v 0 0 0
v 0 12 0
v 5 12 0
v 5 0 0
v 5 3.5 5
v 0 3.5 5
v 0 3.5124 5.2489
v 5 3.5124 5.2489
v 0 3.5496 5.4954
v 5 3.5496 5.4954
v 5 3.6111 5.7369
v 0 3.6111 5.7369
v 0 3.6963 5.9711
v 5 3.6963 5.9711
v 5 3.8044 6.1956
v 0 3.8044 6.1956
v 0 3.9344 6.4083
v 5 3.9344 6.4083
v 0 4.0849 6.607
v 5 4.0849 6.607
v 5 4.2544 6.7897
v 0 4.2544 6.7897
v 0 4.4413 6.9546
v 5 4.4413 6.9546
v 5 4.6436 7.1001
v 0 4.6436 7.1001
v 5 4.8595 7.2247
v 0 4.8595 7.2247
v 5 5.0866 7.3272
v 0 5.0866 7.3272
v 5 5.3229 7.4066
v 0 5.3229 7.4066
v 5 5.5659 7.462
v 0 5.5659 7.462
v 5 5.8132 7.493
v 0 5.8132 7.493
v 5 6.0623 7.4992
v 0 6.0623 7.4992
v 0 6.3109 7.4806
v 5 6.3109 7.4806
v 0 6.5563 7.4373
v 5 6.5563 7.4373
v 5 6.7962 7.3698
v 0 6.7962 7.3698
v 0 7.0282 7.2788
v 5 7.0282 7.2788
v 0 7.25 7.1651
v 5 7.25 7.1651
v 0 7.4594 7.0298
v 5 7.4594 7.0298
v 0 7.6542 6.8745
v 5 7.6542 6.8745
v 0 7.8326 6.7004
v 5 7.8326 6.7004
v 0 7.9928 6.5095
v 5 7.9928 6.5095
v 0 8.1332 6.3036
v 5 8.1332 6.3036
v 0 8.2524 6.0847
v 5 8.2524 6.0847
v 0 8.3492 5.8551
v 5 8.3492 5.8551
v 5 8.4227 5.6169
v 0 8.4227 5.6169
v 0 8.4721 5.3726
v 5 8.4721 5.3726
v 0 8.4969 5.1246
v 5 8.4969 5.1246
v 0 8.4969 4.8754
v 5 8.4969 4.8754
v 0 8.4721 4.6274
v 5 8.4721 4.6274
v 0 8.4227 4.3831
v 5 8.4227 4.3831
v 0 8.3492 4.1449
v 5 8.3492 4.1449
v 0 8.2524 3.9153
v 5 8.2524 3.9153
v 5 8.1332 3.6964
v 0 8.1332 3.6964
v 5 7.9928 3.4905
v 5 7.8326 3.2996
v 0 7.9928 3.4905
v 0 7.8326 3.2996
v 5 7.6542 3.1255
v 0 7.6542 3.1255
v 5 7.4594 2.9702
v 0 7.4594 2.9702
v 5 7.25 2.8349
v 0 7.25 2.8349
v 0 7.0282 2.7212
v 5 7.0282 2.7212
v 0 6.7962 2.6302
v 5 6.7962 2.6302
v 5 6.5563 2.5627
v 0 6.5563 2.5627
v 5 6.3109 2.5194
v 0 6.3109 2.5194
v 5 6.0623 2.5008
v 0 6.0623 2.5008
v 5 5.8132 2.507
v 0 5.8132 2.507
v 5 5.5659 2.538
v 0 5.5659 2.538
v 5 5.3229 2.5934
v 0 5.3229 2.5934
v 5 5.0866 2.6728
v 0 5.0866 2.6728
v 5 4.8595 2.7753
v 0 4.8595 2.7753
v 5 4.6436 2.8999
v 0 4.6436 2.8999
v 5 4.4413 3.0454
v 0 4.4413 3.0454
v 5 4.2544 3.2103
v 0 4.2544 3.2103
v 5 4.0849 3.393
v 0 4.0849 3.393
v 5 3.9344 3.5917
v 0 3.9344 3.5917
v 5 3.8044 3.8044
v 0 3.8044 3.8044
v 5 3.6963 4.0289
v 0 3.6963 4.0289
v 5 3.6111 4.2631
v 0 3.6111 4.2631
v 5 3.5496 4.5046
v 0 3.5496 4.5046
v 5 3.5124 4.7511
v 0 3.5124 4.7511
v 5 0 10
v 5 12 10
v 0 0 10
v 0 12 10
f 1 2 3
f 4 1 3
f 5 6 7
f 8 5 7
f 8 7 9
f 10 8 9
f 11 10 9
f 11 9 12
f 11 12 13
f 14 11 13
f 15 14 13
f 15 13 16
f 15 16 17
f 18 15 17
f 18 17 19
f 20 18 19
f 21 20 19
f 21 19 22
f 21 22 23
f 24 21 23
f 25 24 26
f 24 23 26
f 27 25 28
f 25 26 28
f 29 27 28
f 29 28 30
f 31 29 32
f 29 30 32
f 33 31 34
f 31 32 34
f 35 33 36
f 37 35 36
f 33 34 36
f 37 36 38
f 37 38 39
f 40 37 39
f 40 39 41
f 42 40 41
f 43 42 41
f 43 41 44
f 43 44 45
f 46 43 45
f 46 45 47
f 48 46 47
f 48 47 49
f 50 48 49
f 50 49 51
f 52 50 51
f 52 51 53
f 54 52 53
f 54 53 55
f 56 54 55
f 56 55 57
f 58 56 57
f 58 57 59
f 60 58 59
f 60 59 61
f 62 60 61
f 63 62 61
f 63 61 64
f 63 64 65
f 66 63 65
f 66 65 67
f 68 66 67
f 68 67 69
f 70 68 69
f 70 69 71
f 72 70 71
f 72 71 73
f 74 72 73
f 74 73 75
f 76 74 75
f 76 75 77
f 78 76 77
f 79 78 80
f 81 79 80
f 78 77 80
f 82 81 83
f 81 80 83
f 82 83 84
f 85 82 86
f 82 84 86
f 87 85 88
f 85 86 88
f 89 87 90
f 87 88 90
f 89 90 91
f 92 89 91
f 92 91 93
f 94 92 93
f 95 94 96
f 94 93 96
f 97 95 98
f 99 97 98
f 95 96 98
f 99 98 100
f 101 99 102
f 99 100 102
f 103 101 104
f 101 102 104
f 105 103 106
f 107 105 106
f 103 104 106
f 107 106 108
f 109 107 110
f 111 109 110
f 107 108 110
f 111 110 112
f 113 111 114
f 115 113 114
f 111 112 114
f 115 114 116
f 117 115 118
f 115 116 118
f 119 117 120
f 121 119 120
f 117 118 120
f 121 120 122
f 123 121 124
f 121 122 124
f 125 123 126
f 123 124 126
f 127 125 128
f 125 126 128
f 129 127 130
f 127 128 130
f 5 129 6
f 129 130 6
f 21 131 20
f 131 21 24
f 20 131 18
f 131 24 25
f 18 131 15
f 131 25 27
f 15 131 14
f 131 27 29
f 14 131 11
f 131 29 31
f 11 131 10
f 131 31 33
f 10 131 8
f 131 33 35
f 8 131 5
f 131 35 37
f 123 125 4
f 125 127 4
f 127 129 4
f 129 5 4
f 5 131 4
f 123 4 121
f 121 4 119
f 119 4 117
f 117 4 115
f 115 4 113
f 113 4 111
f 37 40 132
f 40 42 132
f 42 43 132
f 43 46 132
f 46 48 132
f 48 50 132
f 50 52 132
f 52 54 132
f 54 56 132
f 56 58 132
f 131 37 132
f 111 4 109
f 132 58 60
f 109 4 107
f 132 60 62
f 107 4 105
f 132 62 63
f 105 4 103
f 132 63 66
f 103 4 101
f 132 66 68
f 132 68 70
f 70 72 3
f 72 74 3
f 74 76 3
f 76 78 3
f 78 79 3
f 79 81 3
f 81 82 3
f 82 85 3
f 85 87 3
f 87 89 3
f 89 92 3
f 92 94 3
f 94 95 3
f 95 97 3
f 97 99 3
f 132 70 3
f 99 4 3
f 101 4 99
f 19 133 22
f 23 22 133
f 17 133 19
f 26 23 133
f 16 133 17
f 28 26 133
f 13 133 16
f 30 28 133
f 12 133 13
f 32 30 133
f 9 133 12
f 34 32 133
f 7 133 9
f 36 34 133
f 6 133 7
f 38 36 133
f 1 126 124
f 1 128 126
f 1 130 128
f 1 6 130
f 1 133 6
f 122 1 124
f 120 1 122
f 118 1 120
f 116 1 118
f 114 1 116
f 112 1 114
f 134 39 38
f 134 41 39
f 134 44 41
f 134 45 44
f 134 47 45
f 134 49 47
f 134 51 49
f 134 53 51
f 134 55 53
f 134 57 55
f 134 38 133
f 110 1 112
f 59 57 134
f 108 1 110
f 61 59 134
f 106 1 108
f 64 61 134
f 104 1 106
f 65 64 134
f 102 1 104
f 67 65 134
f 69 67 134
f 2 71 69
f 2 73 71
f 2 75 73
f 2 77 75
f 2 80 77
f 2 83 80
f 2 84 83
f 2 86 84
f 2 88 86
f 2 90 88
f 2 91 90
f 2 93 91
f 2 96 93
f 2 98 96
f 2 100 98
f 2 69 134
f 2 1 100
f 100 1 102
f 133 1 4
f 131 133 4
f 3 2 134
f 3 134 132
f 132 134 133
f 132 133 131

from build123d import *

# Parameters (mm, degrees)
F0_W     = 5
F0_H     = 12
F1_DEPTH = 10
F3_D     = 5


with BuildPart() as f1:
    # F0 (on Top) → F1 (new body)
    with BuildSketch(Plane.XY):
        with Locations((2.5, 6)):
            Rectangle(F0_W, F0_H)
    extrude(amount=F1_DEPTH)

    # F3 (through all)
    with Locations(Plane.YZ.offset(5)):
        with Locations((6, 5)):
            Hole(F3_D / 2)


solid = f1.part
